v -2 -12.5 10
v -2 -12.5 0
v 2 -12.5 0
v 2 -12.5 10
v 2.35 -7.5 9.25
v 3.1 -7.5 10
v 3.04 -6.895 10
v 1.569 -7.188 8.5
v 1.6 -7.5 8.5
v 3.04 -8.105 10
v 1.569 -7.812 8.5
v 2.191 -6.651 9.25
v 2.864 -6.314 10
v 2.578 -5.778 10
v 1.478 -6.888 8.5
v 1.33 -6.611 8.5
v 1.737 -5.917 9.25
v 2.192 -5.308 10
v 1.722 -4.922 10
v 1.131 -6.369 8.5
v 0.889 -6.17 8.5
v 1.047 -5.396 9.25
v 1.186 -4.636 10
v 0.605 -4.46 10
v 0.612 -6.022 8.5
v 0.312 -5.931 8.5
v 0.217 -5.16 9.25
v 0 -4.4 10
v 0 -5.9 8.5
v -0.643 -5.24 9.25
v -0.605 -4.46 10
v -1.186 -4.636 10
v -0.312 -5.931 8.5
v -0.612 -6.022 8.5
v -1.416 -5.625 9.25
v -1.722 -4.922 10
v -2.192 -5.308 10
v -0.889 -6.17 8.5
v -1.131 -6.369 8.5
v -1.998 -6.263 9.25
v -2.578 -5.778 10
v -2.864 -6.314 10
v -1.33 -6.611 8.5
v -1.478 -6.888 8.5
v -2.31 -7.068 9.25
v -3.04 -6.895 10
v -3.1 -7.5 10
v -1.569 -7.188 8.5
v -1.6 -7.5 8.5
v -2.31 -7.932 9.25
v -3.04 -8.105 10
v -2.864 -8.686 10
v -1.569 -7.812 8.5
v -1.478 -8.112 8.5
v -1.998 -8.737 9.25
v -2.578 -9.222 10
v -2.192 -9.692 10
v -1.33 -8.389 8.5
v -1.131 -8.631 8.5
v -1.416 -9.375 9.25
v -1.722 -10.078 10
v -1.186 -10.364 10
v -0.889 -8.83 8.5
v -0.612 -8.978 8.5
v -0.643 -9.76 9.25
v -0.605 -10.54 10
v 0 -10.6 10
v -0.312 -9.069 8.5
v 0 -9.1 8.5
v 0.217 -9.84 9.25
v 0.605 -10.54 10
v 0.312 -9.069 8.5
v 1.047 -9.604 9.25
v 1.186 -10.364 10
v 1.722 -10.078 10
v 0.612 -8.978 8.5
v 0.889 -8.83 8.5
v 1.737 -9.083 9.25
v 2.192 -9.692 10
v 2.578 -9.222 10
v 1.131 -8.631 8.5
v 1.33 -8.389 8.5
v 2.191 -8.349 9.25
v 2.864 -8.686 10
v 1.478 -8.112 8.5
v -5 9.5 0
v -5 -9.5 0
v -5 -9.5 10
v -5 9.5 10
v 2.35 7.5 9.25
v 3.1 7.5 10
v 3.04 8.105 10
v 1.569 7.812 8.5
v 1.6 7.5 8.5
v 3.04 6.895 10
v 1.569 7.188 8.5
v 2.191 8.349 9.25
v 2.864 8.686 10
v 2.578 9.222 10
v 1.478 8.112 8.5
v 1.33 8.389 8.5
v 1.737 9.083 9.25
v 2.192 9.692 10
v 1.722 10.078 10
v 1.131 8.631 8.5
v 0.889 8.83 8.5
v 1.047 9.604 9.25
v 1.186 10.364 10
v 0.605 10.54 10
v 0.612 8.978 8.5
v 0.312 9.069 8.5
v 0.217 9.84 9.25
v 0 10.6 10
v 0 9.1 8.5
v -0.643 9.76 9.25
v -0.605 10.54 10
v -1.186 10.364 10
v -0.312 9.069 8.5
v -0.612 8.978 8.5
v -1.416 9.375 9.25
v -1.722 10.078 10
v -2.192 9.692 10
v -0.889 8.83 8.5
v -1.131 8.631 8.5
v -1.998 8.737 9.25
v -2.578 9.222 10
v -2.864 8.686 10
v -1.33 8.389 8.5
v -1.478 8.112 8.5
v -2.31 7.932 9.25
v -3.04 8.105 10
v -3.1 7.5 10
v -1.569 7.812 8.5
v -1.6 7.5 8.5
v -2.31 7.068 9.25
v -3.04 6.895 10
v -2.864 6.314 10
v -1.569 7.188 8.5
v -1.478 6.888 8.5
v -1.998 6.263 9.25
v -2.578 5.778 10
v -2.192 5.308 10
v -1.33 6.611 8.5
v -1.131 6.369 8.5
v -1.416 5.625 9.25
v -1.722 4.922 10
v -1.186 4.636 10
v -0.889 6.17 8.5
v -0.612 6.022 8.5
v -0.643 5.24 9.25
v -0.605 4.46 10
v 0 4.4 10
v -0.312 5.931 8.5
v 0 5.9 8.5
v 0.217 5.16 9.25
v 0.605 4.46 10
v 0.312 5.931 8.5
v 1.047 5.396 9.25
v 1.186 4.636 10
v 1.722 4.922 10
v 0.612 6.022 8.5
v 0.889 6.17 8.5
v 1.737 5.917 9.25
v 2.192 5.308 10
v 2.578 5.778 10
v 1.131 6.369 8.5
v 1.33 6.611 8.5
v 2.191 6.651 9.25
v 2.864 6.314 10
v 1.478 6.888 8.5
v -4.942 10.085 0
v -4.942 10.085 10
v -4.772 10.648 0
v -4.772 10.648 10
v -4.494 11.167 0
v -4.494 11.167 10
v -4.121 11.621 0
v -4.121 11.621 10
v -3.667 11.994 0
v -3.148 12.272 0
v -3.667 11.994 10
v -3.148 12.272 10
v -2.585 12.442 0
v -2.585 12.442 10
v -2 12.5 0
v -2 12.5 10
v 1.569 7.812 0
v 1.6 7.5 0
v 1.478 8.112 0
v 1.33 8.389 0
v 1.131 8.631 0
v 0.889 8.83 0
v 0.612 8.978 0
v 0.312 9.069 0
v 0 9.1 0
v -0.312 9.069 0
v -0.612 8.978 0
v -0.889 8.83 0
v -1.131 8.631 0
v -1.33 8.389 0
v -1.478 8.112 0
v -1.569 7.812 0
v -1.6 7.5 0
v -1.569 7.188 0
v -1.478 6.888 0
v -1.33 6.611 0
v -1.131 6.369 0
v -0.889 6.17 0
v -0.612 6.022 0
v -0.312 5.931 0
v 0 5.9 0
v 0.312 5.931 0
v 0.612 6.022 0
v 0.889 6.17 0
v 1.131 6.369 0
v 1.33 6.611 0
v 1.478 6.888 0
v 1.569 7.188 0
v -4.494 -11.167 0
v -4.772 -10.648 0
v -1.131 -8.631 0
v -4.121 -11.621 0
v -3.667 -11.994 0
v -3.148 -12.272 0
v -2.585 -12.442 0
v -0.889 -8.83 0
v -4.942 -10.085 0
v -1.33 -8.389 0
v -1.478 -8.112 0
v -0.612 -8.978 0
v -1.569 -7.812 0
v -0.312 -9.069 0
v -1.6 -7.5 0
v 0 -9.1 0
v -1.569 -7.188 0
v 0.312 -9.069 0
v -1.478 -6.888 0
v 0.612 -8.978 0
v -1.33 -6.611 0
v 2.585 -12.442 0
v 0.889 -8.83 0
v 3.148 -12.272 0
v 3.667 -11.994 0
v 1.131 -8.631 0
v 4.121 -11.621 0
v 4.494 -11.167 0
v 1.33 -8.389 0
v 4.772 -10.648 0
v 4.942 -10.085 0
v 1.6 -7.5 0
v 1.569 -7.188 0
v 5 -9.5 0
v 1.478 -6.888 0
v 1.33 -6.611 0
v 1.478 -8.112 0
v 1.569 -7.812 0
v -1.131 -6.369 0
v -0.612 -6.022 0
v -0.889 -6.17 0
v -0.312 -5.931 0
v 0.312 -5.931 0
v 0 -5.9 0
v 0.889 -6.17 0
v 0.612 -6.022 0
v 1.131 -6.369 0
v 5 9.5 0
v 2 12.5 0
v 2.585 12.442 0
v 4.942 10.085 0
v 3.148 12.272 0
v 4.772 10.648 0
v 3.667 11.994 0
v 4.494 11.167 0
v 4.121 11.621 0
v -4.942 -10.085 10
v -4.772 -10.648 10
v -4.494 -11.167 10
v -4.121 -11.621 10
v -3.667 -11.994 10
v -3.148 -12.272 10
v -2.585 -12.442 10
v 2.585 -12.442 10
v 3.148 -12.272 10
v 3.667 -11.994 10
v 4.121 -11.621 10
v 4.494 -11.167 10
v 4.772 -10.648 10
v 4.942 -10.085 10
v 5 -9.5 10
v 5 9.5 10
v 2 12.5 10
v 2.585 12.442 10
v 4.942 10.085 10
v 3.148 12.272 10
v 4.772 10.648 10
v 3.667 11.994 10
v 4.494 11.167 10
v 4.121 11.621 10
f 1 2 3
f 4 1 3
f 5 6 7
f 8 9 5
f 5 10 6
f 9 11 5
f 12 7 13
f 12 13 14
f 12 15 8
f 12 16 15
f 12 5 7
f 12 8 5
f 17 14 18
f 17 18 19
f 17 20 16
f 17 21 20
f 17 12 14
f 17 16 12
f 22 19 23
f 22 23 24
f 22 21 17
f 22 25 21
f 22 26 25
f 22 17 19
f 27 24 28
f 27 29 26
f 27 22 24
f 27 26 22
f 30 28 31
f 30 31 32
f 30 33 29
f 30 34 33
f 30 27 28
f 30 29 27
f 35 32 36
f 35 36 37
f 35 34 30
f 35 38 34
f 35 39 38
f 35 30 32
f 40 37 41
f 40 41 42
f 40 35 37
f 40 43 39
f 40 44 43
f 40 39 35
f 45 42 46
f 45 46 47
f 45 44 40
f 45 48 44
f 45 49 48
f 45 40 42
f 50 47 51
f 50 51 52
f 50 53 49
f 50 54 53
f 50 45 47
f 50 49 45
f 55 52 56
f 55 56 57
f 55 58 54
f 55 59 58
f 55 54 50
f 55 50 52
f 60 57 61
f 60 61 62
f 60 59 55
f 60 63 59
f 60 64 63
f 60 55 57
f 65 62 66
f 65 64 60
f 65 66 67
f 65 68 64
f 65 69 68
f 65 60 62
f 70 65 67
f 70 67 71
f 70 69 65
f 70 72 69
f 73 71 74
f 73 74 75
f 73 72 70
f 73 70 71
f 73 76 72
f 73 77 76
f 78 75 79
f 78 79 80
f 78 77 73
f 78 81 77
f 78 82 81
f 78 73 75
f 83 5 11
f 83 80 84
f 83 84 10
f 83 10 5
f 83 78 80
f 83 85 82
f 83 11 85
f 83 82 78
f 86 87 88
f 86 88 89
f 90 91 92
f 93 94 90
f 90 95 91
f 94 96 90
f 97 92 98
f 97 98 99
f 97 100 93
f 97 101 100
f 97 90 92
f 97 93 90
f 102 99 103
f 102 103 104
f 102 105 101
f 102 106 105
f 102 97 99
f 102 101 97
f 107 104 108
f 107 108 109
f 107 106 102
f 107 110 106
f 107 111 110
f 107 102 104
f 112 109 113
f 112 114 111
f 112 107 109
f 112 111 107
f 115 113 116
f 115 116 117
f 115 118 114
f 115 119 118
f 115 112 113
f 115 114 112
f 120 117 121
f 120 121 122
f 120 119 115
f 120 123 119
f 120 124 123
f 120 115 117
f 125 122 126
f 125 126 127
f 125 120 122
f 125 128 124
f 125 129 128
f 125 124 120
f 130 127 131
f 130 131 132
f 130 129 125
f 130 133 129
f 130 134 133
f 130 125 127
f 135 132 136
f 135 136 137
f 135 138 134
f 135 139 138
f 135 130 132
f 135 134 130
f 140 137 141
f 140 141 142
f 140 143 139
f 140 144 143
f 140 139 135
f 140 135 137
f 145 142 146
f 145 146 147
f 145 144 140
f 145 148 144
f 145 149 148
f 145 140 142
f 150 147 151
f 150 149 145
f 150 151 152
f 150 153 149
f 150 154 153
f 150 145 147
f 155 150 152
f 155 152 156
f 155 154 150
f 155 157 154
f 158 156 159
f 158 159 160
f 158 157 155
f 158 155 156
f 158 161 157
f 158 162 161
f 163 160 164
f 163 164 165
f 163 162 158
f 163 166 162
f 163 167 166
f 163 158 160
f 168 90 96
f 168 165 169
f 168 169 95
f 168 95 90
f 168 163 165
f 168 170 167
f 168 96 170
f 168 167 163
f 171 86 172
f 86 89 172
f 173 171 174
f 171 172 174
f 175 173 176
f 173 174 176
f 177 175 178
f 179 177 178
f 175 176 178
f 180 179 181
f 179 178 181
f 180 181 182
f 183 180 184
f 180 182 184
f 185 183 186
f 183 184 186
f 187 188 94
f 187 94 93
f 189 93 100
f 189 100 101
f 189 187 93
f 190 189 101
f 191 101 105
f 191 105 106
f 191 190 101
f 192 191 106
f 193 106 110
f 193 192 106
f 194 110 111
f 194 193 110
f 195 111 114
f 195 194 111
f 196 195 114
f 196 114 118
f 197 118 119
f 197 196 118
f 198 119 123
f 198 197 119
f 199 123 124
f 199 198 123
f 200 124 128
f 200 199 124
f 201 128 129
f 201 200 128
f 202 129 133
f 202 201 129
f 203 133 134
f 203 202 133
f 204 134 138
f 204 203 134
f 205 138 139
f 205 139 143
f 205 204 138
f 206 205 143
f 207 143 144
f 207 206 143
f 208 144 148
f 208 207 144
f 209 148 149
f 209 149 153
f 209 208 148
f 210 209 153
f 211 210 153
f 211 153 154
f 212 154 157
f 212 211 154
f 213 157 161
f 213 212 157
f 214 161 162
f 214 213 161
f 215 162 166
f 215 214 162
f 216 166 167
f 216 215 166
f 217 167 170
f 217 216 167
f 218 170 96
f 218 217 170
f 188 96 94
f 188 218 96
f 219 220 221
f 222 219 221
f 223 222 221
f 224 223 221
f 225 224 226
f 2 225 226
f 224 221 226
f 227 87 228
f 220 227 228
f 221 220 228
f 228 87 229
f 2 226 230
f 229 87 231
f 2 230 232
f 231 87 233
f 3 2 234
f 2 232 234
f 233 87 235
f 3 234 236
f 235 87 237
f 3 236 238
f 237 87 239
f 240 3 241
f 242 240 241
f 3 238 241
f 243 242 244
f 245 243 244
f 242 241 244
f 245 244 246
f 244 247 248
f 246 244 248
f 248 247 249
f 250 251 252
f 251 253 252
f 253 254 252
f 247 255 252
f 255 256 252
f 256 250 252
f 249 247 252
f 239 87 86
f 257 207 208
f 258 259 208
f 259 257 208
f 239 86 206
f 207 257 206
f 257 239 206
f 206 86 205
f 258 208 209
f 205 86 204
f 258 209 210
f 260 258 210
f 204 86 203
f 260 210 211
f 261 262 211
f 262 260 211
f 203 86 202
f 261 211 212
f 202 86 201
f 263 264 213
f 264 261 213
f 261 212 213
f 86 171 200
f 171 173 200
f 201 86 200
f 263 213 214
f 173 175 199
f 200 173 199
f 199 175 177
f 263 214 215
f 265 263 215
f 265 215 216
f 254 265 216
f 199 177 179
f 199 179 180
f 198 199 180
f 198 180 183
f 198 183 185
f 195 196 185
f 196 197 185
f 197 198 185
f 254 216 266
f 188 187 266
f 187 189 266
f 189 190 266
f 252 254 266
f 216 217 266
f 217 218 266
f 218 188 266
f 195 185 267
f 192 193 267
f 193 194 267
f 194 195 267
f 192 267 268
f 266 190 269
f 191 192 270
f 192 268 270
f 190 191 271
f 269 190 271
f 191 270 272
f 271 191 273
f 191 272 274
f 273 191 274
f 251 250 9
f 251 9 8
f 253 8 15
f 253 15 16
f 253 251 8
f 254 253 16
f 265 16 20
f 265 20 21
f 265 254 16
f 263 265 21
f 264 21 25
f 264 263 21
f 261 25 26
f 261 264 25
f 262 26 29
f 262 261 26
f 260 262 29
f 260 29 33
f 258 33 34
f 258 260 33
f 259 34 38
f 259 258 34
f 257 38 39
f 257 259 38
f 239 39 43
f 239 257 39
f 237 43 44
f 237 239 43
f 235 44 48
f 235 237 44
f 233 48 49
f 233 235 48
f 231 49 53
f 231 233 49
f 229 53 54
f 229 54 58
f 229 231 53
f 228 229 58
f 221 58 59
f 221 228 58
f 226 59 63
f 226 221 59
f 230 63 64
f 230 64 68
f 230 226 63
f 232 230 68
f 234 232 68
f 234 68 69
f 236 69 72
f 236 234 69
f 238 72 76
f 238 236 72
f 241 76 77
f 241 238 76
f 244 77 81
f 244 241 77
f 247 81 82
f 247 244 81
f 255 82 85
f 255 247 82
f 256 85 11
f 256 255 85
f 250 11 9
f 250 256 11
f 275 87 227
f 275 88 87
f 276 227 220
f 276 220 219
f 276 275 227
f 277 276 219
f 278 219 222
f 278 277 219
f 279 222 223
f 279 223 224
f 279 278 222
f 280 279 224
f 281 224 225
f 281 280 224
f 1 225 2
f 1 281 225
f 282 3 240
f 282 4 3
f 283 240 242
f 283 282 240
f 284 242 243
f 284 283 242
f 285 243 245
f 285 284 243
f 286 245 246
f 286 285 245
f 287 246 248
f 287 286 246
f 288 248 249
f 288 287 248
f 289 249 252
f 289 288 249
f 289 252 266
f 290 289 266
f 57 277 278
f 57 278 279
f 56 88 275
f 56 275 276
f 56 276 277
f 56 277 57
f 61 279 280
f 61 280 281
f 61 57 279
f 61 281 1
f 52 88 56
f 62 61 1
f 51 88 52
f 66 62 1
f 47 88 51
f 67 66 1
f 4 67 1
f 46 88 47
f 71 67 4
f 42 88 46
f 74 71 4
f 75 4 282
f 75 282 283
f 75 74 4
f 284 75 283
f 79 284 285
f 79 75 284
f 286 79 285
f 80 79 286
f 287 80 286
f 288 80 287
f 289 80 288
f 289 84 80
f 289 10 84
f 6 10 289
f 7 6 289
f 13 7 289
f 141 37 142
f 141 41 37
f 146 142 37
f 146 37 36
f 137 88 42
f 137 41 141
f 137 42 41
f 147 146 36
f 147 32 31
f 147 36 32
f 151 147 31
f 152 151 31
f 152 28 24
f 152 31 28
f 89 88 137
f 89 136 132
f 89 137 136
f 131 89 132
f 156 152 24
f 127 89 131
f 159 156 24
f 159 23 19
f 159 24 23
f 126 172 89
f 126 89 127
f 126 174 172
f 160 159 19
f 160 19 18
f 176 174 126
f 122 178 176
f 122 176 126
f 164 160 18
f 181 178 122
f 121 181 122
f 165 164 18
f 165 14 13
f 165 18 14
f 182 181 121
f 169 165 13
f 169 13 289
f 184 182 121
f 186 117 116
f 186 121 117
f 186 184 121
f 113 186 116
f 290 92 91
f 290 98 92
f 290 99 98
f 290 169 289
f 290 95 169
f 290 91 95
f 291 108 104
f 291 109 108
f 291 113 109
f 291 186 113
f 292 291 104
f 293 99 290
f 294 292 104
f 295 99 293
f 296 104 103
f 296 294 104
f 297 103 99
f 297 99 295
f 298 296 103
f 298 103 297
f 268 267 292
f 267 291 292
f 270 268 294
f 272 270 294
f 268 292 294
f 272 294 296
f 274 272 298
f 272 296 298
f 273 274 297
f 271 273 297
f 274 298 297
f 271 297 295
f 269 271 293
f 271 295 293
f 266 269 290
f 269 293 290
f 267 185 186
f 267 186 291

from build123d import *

# Parameters (mm, degrees)
F0_W     = 10
F0_H     = 25
F0_R     = 1.6
F1_DEPTH = 10
F2_R     = 3
F3_SIZE  = 1.5


with BuildPart() as f1:
    # F0 (on Top) → F1 (new body)
    with BuildSketch(Plane.XY):
        Rectangle(F0_W, F0_H)
        with Locations((0, -7.5)):
            Circle(F0_R, mode=Mode.SUBTRACT)
        with Locations((0, 7.5)):
            Circle(F0_R, mode=Mode.SUBTRACT)
    extrude(amount=F1_DEPTH)

    # F2
    f2_edges = [f1.edges().sort_by_distance(p)[0] for p in [
        (-5, 12.5, 5),
        (-5, -12.5, 5),
        (5, -12.5, 5),
        (5, 12.5, 5),
    ]]
    fillet(f2_edges, radius=F2_R)

    # F3
    f3_edges = [f1.edges().sort_by_distance(p)[0] for p in [
        (-1.6, 7.5, 10),
        (-1.6, -7.5, 10),
    ]]
    chamfer(f3_edges, length=F3_SIZE)


solid = f1.part
